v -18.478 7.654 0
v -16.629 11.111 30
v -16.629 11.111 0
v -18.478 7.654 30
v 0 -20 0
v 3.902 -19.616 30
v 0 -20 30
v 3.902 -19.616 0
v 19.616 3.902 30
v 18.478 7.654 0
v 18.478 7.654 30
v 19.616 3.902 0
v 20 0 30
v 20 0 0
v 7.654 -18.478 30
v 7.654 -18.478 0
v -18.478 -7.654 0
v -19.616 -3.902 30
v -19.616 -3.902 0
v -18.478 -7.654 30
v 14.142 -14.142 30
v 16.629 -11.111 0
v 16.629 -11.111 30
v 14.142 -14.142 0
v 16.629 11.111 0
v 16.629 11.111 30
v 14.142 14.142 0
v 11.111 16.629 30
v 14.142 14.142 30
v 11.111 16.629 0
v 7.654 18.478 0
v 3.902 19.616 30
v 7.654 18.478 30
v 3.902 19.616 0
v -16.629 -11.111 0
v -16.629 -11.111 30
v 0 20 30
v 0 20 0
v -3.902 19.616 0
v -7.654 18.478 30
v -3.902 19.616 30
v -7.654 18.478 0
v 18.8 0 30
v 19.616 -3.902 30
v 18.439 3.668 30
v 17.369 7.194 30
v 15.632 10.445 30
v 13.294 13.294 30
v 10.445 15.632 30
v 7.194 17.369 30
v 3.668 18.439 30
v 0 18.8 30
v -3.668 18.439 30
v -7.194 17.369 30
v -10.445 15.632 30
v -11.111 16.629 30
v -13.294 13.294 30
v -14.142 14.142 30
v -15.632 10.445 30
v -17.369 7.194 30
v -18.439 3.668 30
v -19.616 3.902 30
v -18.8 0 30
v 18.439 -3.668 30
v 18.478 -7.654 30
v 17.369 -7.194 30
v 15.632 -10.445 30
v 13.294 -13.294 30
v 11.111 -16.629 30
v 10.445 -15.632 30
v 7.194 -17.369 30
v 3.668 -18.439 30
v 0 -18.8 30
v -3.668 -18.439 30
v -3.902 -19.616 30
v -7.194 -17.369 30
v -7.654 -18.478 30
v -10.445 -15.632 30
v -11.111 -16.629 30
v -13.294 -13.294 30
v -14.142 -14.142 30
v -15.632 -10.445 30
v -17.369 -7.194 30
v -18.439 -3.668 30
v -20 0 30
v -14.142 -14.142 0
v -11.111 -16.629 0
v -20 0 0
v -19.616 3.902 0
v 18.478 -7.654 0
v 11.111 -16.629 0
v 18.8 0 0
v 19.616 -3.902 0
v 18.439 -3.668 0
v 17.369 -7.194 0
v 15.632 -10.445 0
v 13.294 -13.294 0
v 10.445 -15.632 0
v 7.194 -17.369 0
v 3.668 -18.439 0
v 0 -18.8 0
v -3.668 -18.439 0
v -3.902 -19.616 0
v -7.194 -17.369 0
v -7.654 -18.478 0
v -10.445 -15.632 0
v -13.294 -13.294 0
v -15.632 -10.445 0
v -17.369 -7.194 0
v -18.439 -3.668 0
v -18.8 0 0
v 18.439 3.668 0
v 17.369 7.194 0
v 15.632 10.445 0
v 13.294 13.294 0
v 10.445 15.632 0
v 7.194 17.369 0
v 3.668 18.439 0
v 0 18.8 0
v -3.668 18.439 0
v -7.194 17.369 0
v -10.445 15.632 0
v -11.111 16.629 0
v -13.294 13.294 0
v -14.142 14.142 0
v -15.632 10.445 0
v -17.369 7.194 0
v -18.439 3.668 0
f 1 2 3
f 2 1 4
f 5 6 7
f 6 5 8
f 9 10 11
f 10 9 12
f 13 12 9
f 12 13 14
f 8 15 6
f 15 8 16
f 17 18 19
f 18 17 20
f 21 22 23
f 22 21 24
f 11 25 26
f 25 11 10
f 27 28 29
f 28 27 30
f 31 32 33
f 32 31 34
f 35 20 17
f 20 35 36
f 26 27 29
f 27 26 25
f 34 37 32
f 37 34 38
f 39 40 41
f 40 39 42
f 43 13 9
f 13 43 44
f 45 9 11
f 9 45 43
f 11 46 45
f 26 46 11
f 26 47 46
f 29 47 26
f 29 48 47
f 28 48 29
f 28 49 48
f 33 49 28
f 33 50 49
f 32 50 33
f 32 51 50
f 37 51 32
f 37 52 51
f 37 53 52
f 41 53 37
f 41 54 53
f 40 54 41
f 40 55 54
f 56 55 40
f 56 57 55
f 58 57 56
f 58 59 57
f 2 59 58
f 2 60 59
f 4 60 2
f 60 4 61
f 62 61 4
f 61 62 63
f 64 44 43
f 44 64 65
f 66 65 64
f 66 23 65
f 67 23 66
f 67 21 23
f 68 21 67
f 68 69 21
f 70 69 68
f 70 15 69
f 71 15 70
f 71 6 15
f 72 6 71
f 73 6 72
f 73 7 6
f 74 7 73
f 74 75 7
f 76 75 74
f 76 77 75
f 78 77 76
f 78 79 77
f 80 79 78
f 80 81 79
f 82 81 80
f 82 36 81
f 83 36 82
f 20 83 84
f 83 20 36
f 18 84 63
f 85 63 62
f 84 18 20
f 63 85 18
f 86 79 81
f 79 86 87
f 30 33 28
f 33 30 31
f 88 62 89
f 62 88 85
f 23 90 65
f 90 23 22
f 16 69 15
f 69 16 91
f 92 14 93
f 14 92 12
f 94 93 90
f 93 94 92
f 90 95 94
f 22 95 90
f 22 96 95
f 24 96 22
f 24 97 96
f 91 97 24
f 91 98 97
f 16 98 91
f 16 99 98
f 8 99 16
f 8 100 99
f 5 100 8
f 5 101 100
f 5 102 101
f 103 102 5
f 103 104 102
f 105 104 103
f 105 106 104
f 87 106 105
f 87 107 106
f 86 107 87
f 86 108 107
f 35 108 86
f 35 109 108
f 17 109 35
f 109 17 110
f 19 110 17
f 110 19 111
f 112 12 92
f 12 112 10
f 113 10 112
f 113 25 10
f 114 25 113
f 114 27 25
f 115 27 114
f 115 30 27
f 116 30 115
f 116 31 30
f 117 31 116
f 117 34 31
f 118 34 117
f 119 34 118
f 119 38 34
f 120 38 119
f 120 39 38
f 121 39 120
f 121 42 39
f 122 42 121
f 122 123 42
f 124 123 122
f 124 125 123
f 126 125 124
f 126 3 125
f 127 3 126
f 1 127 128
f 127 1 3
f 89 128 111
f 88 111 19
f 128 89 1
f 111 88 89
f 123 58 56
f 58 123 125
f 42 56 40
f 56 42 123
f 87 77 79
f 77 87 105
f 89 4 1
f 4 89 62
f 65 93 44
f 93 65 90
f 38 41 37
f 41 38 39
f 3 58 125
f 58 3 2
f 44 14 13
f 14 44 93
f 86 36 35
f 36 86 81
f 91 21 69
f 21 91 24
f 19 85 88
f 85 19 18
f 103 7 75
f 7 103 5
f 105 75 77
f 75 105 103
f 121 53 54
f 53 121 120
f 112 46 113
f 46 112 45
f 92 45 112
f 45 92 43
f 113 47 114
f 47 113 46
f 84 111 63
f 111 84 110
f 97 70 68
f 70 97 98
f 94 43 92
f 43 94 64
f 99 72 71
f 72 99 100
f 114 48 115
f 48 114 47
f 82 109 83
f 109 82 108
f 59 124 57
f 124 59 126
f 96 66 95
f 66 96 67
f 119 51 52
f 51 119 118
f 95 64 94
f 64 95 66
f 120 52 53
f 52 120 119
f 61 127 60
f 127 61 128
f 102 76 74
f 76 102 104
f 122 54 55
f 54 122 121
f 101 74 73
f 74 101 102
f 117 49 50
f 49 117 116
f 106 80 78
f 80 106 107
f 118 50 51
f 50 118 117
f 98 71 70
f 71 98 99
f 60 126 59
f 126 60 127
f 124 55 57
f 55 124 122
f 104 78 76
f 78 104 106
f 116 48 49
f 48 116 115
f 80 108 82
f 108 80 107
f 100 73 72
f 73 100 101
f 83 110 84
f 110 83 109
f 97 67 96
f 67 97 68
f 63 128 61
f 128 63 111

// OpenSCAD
$fn = 32;

// ----------------------------------------------------------------------
// Thin tube: 1.2 mm wall
// ----------------------------------------------------------------------

// --- parameters (mm) ---
tube_od = 40;             // outer diameter
tube_h = 30;              // height, Z
wall = 1.2;               // wall thickness

difference() {
  cylinder(h = tube_h, d = tube_od);
  translate([0, 0, -1]) cylinder(h = tube_h + 2, d = tube_od - 2 * wall);
}
